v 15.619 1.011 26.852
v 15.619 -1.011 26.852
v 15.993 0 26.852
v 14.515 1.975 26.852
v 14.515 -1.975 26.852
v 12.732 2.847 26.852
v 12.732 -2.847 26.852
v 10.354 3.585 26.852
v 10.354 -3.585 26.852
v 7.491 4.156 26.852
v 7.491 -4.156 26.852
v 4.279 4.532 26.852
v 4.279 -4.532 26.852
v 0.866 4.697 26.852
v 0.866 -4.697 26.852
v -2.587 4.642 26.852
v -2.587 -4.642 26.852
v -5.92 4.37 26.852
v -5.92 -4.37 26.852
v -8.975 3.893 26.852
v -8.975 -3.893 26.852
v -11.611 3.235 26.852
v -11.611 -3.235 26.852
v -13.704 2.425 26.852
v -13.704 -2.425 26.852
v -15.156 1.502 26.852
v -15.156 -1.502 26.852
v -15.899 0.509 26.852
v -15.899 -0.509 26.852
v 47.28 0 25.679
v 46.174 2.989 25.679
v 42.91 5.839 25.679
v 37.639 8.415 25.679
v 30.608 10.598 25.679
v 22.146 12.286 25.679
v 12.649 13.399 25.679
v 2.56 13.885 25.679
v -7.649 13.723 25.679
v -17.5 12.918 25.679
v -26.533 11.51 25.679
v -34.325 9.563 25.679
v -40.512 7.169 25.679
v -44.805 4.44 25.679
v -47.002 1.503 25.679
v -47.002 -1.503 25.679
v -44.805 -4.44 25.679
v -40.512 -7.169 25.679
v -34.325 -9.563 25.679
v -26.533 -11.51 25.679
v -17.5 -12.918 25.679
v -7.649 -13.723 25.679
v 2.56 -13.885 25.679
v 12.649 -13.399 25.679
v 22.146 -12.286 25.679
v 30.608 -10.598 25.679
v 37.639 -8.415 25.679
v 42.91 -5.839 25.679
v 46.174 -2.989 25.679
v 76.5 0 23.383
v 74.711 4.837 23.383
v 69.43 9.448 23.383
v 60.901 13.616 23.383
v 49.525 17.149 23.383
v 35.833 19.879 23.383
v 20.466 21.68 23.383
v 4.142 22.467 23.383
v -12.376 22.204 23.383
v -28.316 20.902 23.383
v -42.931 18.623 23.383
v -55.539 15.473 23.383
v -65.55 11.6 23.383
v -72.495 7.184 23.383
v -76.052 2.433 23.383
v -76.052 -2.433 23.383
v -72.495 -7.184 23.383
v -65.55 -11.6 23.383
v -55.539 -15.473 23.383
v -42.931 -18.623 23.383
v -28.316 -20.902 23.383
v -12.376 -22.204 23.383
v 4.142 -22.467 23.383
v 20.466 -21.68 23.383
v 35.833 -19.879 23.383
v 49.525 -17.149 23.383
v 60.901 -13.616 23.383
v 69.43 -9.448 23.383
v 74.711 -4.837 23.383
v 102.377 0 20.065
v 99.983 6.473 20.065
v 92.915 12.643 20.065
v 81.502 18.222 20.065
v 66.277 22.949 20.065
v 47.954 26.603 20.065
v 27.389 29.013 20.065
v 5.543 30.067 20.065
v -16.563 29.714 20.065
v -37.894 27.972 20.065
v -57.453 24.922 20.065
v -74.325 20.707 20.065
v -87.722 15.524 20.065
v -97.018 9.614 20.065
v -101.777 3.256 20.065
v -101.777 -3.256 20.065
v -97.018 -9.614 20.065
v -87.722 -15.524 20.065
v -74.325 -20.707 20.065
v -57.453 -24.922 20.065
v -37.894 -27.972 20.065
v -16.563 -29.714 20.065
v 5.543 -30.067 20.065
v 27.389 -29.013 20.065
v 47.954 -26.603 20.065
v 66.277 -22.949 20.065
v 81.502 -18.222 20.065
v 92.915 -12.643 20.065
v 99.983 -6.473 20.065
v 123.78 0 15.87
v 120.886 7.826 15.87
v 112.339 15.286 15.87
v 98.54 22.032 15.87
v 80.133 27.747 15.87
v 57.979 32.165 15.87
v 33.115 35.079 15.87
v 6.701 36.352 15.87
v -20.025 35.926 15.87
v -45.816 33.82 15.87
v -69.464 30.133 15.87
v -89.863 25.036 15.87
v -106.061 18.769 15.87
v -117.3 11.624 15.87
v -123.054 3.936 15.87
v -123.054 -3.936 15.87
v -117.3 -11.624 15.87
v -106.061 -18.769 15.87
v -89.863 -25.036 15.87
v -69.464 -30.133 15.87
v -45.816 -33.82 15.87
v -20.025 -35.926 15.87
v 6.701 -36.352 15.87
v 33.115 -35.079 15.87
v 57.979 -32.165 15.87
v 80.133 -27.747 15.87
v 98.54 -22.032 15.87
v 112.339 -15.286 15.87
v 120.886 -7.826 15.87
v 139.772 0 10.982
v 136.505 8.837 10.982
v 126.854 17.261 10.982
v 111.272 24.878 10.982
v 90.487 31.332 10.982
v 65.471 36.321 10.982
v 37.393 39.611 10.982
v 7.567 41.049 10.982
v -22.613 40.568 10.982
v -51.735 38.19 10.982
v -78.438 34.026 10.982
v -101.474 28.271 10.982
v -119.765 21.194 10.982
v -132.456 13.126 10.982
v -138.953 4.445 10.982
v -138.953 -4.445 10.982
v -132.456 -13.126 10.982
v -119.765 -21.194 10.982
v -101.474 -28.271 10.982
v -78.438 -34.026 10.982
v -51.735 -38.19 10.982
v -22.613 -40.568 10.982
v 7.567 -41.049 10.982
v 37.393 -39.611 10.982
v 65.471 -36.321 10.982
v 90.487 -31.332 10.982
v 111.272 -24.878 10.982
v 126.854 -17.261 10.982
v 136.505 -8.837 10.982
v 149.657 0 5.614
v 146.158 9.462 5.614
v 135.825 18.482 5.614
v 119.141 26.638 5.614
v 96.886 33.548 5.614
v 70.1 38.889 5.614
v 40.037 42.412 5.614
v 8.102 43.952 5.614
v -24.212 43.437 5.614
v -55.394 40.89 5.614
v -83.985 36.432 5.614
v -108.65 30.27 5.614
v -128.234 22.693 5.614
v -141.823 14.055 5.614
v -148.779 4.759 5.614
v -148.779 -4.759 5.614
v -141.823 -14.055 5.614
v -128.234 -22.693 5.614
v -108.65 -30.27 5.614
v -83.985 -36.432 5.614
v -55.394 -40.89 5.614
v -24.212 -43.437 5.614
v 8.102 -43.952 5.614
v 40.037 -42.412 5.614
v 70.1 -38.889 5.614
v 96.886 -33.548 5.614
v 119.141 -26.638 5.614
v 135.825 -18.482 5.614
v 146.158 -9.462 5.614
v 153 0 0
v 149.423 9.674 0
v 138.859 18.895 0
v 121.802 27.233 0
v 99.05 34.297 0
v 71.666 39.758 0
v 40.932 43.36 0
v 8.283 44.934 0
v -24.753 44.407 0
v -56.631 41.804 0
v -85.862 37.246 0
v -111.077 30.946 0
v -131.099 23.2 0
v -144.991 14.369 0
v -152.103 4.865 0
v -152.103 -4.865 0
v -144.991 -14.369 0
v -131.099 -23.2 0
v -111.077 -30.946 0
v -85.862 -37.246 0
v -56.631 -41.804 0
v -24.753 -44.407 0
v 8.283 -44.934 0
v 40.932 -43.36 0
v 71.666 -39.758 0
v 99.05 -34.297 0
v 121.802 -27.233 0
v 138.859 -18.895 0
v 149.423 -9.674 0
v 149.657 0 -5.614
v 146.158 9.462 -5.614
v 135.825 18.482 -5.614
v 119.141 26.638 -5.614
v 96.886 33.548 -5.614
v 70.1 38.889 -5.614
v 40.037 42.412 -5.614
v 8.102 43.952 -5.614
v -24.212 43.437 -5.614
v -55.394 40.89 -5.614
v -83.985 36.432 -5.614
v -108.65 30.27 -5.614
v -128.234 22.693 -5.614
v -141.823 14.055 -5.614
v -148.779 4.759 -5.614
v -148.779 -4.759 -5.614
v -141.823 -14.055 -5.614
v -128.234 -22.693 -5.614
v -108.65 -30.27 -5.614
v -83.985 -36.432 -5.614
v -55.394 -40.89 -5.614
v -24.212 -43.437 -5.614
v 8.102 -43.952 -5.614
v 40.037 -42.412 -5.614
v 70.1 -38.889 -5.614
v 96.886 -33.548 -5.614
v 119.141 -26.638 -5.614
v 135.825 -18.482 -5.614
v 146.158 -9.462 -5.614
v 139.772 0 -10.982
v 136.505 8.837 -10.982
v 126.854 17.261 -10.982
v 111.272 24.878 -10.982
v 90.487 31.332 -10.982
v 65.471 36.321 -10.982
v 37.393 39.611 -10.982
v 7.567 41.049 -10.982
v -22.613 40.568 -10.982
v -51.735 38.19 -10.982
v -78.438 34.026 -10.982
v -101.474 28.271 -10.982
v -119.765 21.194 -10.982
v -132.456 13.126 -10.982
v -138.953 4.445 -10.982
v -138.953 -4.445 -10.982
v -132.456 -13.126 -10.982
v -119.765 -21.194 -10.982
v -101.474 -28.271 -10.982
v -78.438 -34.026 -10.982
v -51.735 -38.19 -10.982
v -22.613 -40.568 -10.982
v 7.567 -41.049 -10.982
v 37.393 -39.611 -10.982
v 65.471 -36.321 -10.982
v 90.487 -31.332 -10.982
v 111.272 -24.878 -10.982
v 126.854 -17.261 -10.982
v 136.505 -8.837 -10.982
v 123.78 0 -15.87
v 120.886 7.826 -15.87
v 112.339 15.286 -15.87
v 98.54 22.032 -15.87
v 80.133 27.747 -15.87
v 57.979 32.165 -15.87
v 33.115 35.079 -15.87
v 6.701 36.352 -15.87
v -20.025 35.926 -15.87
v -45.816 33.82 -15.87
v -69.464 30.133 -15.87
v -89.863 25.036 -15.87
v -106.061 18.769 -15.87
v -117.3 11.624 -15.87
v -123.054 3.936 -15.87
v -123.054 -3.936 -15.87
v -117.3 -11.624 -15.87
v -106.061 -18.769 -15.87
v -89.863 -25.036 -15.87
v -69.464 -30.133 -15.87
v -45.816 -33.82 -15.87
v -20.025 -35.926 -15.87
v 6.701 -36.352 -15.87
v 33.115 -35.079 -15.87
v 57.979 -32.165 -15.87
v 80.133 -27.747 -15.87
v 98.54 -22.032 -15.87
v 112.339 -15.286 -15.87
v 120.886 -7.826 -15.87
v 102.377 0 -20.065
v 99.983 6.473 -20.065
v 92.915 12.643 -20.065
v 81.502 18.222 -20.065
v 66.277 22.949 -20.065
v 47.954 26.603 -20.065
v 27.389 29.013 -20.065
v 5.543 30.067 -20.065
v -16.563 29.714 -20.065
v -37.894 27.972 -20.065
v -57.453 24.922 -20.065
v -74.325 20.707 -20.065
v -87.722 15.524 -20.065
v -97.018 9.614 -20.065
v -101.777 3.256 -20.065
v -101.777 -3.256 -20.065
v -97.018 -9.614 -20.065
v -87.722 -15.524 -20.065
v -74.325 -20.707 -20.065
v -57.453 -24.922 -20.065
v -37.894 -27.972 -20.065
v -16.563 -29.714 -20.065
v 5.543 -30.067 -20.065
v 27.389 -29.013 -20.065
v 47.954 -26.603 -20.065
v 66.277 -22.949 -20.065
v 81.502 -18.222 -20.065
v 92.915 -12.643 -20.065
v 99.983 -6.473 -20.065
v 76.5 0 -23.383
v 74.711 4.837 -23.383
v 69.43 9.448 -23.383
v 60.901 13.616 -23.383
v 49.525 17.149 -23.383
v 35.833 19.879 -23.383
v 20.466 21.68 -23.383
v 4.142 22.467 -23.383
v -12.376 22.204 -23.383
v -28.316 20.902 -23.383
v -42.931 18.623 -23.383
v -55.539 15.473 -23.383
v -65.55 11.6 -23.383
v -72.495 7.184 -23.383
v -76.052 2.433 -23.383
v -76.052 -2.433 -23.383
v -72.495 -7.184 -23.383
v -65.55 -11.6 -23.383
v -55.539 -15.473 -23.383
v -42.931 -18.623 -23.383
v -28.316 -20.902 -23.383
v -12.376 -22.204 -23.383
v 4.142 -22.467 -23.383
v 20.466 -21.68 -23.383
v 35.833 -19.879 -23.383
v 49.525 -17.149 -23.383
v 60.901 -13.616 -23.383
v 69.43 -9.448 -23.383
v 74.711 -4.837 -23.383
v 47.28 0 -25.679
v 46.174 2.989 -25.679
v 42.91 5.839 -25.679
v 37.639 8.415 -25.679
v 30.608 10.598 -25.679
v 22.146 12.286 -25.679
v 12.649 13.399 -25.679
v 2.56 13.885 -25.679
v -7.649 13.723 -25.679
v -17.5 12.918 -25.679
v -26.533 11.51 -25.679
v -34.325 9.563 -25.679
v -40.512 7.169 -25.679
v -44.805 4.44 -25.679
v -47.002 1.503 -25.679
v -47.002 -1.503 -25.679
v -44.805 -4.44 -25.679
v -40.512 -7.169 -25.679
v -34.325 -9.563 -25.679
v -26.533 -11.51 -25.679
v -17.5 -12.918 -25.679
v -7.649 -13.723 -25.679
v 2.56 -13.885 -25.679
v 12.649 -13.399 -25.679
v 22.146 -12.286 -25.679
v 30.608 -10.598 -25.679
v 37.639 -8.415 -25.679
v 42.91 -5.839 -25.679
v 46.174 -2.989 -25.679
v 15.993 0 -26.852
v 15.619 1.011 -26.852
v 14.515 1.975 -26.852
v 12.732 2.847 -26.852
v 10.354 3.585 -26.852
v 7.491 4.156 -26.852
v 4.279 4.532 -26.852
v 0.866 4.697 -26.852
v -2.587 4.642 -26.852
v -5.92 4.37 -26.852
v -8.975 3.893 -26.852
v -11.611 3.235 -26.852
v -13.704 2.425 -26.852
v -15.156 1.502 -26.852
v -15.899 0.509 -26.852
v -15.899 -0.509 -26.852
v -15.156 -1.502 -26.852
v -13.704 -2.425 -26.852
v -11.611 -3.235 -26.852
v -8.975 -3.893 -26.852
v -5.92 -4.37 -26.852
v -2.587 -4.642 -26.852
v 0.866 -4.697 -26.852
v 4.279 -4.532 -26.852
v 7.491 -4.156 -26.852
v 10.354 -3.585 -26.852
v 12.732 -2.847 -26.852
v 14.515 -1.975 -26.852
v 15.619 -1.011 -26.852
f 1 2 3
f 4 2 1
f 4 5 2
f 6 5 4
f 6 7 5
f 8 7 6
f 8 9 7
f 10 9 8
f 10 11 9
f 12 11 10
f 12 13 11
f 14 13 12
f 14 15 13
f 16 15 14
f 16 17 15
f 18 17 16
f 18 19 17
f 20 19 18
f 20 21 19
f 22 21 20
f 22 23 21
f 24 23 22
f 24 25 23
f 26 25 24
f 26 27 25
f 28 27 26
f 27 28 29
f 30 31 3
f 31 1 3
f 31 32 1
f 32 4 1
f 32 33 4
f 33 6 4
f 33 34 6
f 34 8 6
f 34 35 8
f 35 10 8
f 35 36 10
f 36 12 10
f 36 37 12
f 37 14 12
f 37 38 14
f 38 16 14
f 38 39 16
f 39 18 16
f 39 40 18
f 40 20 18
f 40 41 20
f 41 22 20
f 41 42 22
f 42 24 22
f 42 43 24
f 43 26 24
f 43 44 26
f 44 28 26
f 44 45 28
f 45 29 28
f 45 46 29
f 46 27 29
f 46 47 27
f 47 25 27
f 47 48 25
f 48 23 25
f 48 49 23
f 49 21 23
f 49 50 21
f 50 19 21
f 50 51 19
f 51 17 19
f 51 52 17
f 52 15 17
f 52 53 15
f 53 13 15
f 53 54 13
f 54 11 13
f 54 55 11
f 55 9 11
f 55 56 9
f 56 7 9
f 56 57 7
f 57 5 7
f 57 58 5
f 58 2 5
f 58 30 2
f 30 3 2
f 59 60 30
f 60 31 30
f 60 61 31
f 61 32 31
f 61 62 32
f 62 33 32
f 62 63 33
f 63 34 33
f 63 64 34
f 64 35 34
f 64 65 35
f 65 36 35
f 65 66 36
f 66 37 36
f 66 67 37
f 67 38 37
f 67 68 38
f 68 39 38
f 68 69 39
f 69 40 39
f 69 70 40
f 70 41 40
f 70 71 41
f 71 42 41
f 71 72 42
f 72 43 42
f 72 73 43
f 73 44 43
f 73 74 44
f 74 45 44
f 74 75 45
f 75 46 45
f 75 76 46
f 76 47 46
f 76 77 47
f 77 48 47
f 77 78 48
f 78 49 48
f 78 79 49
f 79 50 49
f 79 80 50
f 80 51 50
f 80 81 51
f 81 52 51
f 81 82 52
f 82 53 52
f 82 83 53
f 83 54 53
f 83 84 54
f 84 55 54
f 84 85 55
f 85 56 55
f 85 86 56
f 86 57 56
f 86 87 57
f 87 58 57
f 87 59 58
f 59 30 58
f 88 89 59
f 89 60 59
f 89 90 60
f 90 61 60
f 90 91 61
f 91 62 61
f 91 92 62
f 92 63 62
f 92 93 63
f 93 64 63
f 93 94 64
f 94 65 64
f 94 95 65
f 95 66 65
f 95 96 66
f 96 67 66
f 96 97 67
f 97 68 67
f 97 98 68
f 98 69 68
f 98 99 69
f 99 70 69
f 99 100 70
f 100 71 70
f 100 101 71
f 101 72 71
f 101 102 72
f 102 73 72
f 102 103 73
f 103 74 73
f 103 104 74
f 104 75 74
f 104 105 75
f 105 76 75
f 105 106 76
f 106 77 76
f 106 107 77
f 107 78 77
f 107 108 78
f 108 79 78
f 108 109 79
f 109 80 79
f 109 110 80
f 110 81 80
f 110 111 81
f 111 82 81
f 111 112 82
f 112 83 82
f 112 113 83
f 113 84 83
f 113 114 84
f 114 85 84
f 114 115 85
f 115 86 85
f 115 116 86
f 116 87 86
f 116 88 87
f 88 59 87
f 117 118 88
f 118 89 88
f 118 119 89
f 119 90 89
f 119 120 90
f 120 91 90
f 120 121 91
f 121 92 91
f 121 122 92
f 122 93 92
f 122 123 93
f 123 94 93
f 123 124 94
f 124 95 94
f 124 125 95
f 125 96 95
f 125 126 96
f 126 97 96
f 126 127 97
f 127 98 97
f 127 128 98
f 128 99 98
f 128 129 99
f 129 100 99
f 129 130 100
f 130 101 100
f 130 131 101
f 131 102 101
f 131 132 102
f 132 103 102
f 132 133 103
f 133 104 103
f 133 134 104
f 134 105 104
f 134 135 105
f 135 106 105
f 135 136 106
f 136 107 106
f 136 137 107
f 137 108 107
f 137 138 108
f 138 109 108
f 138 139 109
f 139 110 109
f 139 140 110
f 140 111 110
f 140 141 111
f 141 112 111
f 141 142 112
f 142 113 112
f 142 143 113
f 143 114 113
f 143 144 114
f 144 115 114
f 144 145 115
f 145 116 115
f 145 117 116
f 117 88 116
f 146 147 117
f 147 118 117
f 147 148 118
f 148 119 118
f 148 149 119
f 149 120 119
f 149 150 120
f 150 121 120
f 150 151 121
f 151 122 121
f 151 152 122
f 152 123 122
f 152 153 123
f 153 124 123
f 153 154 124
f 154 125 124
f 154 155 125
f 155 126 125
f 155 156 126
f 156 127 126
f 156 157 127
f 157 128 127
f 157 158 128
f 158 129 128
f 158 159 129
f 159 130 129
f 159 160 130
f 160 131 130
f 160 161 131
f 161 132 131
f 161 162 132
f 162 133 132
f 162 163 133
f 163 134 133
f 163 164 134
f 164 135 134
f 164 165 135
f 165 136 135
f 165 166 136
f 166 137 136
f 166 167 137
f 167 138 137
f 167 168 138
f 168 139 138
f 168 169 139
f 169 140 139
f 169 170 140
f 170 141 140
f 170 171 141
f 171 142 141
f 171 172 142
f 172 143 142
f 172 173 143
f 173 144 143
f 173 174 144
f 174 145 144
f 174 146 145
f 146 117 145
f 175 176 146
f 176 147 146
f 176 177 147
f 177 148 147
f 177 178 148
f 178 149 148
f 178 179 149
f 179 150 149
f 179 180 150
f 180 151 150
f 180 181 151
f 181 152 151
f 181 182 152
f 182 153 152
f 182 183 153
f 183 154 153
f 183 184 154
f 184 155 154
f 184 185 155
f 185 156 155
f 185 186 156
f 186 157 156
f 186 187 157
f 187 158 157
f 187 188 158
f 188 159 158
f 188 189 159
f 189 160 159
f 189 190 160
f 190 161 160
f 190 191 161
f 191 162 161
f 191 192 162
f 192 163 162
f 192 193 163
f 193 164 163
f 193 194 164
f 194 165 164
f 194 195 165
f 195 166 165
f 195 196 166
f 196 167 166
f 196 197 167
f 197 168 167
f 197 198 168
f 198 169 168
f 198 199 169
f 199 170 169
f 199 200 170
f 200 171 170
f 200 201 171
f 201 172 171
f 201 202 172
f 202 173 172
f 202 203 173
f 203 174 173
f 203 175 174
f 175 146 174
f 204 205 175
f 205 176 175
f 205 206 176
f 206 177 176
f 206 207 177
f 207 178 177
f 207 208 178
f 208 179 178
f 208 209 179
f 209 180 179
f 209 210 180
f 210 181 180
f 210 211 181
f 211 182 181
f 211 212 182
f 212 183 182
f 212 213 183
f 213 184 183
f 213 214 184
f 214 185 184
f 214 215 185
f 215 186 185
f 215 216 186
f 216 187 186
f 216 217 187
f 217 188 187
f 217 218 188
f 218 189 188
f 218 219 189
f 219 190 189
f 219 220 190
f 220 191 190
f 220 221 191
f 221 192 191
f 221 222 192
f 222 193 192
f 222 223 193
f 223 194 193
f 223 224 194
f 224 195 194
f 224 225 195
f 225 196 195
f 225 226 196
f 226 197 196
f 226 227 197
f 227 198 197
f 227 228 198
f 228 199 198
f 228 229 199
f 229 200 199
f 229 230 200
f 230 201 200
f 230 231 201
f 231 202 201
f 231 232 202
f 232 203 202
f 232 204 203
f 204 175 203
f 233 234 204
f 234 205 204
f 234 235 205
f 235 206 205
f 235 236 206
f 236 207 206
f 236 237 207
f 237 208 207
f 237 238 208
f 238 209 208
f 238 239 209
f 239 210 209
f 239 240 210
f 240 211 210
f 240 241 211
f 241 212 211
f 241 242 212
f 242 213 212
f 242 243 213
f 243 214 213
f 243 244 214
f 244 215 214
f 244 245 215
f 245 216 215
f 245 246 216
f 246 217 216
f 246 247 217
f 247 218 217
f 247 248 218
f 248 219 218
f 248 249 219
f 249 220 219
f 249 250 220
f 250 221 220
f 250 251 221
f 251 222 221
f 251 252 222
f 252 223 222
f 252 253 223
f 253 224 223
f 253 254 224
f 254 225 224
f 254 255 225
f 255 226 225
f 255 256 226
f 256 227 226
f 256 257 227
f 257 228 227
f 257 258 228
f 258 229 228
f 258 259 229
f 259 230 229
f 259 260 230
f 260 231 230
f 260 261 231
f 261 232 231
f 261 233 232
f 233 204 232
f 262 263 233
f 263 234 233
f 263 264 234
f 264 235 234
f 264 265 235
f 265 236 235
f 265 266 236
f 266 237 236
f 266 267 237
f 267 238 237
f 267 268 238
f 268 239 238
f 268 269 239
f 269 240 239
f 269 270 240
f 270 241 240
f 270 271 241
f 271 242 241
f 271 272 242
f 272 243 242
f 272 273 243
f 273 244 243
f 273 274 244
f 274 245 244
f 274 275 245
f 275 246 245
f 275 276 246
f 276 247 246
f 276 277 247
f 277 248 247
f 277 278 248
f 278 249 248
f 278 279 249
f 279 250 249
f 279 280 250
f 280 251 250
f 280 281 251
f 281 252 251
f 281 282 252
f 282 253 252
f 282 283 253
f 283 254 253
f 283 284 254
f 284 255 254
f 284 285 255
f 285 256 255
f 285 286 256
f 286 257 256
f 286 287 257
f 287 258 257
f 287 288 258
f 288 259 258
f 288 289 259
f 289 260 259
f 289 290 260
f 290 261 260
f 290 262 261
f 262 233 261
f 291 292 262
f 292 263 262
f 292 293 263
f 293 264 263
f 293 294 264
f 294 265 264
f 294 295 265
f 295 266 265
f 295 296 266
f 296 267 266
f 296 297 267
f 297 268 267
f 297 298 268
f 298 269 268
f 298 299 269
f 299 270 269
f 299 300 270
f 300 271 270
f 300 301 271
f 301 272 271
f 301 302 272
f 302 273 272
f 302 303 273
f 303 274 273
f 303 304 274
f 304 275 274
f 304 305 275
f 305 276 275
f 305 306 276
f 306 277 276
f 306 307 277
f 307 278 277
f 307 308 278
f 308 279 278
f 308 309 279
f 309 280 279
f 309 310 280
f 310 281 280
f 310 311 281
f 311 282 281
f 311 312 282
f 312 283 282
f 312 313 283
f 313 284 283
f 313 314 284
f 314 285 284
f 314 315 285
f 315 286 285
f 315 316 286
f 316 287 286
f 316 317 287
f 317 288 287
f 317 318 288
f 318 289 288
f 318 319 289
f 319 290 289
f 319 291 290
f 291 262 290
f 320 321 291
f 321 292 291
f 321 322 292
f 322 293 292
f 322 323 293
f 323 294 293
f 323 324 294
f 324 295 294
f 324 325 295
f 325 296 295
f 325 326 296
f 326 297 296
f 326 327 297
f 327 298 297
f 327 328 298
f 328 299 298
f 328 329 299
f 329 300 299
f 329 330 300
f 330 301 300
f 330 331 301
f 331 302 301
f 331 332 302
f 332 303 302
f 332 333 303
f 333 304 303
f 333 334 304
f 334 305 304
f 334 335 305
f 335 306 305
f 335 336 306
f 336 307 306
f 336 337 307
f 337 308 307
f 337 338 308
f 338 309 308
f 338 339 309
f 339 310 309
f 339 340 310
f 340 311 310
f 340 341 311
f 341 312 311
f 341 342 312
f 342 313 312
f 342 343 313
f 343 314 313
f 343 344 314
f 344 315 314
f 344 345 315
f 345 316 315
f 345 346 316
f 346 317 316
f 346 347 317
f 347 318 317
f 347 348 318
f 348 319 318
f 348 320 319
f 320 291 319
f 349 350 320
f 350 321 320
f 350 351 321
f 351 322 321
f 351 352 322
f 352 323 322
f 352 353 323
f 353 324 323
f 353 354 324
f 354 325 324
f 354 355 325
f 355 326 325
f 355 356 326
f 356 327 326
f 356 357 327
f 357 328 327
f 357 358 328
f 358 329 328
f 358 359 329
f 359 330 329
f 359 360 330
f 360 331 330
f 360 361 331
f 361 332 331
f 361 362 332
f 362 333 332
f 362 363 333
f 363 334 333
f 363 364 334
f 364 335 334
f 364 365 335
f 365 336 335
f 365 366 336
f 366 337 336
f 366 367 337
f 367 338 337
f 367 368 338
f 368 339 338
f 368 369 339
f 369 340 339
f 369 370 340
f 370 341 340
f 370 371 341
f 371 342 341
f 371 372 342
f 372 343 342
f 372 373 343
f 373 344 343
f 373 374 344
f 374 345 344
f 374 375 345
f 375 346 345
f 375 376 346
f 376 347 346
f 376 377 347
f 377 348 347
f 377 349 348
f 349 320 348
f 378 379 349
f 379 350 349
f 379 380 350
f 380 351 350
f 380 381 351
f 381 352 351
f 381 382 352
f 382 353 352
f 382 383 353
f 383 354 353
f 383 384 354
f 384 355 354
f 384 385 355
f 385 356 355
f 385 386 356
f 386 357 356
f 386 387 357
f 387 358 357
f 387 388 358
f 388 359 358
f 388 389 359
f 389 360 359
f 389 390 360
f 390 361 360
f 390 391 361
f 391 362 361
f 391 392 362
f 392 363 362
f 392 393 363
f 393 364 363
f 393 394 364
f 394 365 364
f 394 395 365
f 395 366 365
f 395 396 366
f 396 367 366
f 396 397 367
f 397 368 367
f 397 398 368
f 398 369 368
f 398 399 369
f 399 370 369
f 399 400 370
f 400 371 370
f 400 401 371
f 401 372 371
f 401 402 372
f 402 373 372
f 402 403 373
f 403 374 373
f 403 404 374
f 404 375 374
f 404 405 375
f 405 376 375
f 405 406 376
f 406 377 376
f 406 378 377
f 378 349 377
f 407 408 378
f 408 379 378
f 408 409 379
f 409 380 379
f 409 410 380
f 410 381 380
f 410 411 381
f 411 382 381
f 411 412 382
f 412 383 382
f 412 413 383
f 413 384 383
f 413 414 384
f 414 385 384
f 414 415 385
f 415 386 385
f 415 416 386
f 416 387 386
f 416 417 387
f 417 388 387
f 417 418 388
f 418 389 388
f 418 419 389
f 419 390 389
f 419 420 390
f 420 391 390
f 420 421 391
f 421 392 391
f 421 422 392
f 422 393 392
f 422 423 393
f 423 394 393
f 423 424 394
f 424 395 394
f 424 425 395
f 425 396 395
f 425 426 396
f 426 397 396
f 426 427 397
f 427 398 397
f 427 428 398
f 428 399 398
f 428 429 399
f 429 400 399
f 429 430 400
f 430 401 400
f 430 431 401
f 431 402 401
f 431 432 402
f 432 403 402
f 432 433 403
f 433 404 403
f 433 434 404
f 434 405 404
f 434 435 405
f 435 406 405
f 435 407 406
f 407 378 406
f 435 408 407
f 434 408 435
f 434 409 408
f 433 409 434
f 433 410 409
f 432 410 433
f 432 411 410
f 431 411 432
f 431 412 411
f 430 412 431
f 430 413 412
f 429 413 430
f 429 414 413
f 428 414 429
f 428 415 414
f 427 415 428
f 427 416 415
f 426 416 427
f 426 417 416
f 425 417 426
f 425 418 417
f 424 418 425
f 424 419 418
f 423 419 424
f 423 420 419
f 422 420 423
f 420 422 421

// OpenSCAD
// Generated by SolidPython 1.0.1 on 2020-07-29 00:46:52


scale(v = [17, 5, 3]) {
	sphere(r = 9);
}
/***********************************************
*********      SolidPython code:      **********
************************************************
 
# import packages: SolidPython
from solid import *
from solid.utils import *
from itertools import chain, combinations, permutations


class Resize:

    def __init__(self, scad_file):
        self.scad_file = scad_file
        #self.scad_file = import_scad(scad_file)
        # cone/cylinder param:
        self.r1 = 0
        self.r2 = 0
        self.h = 0
        # rectangular prism param:
        self.w = 0
        self.l = 0
        # ellipse param:
        self.r = 0

    # import OpenScad code (file name corresponds to shape)


    # classify shape + parameters
    def assign(self, param1, param2, param3):
        if self.scad_file == 'cone.scad':
            self.r1 = param1
            self.r2 = param2
            self.h = param3
        elif self.scad_file == 'cylinder.scad':
            self.r1 = param1
            self.r2 = param2
            self.h = param3
        elif self.scad_file == 'rectangularPrism.scad':
            self.h = param1
            self.l = param2
            self.w = param3
        else:
            self.r = param1
            self.h = param2

    # resize parameters
    def iterate(self):
        x = range(3, 20, 2)
        i = 1
        if self.scad_file == 'cone.scad':
            tempList = list(permutations(x, 2))
            for temp in tempList:
                param1 = temp[0]
                param2 = temp[1]
                filepath = 'produced_scad_files/' + 'cone' + str(param1) + '_' + str(param2) + '_' + '.scad'
                scad_render_to_file(cylinder(h=param1, r1=param2, r2=0), filepath)

        elif self.scad_file == 'cylinder.scad':
            tempList = list(permutations(x, 3))
            for temp in tempList:
                param1 = temp[0]
                param2 = temp[1]
                filepath = 'produced_scad_files/' + 'cylinder' + str(param1) + '_' + str(param2) + '_' + '.scad'
                scad_render_to_file(cylinder(h=param1, r1=param2, r2=param2), filepath)

        elif self.scad_file == 'rectangularPrism.scad':
            tempList = list(permutations(x, 3))
            for temp in tempList:
                param1 = temp[0]
                param2 = temp[1]
                param3 = temp[2]
                filepath = 'produced_scad_files/' + 'rectangularPrism' + str(param1) + '_' + str(param2) + '_' + str(
                    param3) + '.scad'
                scad_render_to_file(cube(size=(param1, param2, param3)), filepath)

        elif self.scad_file == 'ellipse.scad':
            tempList = list(permutations(x, 4))
            for temp in tempList:
                param1 = temp[0]
                param2 = temp[1]
                param3 = temp[2]
                param4 = temp[3]
                filepath = 'produced_scad_files/' + 'ellipse' + str(param1) + '_' + str(param2) + '_' + str(param3) + '_' + str(param4) + '.scad'
                scad_render_to_file(scale([param1, param2, param3])(sphere(r=param4)), filepath)

    def render_to_scadfile(self):
        scad_render_to_file(scad, 'example.scad') 
 
************************************************/
